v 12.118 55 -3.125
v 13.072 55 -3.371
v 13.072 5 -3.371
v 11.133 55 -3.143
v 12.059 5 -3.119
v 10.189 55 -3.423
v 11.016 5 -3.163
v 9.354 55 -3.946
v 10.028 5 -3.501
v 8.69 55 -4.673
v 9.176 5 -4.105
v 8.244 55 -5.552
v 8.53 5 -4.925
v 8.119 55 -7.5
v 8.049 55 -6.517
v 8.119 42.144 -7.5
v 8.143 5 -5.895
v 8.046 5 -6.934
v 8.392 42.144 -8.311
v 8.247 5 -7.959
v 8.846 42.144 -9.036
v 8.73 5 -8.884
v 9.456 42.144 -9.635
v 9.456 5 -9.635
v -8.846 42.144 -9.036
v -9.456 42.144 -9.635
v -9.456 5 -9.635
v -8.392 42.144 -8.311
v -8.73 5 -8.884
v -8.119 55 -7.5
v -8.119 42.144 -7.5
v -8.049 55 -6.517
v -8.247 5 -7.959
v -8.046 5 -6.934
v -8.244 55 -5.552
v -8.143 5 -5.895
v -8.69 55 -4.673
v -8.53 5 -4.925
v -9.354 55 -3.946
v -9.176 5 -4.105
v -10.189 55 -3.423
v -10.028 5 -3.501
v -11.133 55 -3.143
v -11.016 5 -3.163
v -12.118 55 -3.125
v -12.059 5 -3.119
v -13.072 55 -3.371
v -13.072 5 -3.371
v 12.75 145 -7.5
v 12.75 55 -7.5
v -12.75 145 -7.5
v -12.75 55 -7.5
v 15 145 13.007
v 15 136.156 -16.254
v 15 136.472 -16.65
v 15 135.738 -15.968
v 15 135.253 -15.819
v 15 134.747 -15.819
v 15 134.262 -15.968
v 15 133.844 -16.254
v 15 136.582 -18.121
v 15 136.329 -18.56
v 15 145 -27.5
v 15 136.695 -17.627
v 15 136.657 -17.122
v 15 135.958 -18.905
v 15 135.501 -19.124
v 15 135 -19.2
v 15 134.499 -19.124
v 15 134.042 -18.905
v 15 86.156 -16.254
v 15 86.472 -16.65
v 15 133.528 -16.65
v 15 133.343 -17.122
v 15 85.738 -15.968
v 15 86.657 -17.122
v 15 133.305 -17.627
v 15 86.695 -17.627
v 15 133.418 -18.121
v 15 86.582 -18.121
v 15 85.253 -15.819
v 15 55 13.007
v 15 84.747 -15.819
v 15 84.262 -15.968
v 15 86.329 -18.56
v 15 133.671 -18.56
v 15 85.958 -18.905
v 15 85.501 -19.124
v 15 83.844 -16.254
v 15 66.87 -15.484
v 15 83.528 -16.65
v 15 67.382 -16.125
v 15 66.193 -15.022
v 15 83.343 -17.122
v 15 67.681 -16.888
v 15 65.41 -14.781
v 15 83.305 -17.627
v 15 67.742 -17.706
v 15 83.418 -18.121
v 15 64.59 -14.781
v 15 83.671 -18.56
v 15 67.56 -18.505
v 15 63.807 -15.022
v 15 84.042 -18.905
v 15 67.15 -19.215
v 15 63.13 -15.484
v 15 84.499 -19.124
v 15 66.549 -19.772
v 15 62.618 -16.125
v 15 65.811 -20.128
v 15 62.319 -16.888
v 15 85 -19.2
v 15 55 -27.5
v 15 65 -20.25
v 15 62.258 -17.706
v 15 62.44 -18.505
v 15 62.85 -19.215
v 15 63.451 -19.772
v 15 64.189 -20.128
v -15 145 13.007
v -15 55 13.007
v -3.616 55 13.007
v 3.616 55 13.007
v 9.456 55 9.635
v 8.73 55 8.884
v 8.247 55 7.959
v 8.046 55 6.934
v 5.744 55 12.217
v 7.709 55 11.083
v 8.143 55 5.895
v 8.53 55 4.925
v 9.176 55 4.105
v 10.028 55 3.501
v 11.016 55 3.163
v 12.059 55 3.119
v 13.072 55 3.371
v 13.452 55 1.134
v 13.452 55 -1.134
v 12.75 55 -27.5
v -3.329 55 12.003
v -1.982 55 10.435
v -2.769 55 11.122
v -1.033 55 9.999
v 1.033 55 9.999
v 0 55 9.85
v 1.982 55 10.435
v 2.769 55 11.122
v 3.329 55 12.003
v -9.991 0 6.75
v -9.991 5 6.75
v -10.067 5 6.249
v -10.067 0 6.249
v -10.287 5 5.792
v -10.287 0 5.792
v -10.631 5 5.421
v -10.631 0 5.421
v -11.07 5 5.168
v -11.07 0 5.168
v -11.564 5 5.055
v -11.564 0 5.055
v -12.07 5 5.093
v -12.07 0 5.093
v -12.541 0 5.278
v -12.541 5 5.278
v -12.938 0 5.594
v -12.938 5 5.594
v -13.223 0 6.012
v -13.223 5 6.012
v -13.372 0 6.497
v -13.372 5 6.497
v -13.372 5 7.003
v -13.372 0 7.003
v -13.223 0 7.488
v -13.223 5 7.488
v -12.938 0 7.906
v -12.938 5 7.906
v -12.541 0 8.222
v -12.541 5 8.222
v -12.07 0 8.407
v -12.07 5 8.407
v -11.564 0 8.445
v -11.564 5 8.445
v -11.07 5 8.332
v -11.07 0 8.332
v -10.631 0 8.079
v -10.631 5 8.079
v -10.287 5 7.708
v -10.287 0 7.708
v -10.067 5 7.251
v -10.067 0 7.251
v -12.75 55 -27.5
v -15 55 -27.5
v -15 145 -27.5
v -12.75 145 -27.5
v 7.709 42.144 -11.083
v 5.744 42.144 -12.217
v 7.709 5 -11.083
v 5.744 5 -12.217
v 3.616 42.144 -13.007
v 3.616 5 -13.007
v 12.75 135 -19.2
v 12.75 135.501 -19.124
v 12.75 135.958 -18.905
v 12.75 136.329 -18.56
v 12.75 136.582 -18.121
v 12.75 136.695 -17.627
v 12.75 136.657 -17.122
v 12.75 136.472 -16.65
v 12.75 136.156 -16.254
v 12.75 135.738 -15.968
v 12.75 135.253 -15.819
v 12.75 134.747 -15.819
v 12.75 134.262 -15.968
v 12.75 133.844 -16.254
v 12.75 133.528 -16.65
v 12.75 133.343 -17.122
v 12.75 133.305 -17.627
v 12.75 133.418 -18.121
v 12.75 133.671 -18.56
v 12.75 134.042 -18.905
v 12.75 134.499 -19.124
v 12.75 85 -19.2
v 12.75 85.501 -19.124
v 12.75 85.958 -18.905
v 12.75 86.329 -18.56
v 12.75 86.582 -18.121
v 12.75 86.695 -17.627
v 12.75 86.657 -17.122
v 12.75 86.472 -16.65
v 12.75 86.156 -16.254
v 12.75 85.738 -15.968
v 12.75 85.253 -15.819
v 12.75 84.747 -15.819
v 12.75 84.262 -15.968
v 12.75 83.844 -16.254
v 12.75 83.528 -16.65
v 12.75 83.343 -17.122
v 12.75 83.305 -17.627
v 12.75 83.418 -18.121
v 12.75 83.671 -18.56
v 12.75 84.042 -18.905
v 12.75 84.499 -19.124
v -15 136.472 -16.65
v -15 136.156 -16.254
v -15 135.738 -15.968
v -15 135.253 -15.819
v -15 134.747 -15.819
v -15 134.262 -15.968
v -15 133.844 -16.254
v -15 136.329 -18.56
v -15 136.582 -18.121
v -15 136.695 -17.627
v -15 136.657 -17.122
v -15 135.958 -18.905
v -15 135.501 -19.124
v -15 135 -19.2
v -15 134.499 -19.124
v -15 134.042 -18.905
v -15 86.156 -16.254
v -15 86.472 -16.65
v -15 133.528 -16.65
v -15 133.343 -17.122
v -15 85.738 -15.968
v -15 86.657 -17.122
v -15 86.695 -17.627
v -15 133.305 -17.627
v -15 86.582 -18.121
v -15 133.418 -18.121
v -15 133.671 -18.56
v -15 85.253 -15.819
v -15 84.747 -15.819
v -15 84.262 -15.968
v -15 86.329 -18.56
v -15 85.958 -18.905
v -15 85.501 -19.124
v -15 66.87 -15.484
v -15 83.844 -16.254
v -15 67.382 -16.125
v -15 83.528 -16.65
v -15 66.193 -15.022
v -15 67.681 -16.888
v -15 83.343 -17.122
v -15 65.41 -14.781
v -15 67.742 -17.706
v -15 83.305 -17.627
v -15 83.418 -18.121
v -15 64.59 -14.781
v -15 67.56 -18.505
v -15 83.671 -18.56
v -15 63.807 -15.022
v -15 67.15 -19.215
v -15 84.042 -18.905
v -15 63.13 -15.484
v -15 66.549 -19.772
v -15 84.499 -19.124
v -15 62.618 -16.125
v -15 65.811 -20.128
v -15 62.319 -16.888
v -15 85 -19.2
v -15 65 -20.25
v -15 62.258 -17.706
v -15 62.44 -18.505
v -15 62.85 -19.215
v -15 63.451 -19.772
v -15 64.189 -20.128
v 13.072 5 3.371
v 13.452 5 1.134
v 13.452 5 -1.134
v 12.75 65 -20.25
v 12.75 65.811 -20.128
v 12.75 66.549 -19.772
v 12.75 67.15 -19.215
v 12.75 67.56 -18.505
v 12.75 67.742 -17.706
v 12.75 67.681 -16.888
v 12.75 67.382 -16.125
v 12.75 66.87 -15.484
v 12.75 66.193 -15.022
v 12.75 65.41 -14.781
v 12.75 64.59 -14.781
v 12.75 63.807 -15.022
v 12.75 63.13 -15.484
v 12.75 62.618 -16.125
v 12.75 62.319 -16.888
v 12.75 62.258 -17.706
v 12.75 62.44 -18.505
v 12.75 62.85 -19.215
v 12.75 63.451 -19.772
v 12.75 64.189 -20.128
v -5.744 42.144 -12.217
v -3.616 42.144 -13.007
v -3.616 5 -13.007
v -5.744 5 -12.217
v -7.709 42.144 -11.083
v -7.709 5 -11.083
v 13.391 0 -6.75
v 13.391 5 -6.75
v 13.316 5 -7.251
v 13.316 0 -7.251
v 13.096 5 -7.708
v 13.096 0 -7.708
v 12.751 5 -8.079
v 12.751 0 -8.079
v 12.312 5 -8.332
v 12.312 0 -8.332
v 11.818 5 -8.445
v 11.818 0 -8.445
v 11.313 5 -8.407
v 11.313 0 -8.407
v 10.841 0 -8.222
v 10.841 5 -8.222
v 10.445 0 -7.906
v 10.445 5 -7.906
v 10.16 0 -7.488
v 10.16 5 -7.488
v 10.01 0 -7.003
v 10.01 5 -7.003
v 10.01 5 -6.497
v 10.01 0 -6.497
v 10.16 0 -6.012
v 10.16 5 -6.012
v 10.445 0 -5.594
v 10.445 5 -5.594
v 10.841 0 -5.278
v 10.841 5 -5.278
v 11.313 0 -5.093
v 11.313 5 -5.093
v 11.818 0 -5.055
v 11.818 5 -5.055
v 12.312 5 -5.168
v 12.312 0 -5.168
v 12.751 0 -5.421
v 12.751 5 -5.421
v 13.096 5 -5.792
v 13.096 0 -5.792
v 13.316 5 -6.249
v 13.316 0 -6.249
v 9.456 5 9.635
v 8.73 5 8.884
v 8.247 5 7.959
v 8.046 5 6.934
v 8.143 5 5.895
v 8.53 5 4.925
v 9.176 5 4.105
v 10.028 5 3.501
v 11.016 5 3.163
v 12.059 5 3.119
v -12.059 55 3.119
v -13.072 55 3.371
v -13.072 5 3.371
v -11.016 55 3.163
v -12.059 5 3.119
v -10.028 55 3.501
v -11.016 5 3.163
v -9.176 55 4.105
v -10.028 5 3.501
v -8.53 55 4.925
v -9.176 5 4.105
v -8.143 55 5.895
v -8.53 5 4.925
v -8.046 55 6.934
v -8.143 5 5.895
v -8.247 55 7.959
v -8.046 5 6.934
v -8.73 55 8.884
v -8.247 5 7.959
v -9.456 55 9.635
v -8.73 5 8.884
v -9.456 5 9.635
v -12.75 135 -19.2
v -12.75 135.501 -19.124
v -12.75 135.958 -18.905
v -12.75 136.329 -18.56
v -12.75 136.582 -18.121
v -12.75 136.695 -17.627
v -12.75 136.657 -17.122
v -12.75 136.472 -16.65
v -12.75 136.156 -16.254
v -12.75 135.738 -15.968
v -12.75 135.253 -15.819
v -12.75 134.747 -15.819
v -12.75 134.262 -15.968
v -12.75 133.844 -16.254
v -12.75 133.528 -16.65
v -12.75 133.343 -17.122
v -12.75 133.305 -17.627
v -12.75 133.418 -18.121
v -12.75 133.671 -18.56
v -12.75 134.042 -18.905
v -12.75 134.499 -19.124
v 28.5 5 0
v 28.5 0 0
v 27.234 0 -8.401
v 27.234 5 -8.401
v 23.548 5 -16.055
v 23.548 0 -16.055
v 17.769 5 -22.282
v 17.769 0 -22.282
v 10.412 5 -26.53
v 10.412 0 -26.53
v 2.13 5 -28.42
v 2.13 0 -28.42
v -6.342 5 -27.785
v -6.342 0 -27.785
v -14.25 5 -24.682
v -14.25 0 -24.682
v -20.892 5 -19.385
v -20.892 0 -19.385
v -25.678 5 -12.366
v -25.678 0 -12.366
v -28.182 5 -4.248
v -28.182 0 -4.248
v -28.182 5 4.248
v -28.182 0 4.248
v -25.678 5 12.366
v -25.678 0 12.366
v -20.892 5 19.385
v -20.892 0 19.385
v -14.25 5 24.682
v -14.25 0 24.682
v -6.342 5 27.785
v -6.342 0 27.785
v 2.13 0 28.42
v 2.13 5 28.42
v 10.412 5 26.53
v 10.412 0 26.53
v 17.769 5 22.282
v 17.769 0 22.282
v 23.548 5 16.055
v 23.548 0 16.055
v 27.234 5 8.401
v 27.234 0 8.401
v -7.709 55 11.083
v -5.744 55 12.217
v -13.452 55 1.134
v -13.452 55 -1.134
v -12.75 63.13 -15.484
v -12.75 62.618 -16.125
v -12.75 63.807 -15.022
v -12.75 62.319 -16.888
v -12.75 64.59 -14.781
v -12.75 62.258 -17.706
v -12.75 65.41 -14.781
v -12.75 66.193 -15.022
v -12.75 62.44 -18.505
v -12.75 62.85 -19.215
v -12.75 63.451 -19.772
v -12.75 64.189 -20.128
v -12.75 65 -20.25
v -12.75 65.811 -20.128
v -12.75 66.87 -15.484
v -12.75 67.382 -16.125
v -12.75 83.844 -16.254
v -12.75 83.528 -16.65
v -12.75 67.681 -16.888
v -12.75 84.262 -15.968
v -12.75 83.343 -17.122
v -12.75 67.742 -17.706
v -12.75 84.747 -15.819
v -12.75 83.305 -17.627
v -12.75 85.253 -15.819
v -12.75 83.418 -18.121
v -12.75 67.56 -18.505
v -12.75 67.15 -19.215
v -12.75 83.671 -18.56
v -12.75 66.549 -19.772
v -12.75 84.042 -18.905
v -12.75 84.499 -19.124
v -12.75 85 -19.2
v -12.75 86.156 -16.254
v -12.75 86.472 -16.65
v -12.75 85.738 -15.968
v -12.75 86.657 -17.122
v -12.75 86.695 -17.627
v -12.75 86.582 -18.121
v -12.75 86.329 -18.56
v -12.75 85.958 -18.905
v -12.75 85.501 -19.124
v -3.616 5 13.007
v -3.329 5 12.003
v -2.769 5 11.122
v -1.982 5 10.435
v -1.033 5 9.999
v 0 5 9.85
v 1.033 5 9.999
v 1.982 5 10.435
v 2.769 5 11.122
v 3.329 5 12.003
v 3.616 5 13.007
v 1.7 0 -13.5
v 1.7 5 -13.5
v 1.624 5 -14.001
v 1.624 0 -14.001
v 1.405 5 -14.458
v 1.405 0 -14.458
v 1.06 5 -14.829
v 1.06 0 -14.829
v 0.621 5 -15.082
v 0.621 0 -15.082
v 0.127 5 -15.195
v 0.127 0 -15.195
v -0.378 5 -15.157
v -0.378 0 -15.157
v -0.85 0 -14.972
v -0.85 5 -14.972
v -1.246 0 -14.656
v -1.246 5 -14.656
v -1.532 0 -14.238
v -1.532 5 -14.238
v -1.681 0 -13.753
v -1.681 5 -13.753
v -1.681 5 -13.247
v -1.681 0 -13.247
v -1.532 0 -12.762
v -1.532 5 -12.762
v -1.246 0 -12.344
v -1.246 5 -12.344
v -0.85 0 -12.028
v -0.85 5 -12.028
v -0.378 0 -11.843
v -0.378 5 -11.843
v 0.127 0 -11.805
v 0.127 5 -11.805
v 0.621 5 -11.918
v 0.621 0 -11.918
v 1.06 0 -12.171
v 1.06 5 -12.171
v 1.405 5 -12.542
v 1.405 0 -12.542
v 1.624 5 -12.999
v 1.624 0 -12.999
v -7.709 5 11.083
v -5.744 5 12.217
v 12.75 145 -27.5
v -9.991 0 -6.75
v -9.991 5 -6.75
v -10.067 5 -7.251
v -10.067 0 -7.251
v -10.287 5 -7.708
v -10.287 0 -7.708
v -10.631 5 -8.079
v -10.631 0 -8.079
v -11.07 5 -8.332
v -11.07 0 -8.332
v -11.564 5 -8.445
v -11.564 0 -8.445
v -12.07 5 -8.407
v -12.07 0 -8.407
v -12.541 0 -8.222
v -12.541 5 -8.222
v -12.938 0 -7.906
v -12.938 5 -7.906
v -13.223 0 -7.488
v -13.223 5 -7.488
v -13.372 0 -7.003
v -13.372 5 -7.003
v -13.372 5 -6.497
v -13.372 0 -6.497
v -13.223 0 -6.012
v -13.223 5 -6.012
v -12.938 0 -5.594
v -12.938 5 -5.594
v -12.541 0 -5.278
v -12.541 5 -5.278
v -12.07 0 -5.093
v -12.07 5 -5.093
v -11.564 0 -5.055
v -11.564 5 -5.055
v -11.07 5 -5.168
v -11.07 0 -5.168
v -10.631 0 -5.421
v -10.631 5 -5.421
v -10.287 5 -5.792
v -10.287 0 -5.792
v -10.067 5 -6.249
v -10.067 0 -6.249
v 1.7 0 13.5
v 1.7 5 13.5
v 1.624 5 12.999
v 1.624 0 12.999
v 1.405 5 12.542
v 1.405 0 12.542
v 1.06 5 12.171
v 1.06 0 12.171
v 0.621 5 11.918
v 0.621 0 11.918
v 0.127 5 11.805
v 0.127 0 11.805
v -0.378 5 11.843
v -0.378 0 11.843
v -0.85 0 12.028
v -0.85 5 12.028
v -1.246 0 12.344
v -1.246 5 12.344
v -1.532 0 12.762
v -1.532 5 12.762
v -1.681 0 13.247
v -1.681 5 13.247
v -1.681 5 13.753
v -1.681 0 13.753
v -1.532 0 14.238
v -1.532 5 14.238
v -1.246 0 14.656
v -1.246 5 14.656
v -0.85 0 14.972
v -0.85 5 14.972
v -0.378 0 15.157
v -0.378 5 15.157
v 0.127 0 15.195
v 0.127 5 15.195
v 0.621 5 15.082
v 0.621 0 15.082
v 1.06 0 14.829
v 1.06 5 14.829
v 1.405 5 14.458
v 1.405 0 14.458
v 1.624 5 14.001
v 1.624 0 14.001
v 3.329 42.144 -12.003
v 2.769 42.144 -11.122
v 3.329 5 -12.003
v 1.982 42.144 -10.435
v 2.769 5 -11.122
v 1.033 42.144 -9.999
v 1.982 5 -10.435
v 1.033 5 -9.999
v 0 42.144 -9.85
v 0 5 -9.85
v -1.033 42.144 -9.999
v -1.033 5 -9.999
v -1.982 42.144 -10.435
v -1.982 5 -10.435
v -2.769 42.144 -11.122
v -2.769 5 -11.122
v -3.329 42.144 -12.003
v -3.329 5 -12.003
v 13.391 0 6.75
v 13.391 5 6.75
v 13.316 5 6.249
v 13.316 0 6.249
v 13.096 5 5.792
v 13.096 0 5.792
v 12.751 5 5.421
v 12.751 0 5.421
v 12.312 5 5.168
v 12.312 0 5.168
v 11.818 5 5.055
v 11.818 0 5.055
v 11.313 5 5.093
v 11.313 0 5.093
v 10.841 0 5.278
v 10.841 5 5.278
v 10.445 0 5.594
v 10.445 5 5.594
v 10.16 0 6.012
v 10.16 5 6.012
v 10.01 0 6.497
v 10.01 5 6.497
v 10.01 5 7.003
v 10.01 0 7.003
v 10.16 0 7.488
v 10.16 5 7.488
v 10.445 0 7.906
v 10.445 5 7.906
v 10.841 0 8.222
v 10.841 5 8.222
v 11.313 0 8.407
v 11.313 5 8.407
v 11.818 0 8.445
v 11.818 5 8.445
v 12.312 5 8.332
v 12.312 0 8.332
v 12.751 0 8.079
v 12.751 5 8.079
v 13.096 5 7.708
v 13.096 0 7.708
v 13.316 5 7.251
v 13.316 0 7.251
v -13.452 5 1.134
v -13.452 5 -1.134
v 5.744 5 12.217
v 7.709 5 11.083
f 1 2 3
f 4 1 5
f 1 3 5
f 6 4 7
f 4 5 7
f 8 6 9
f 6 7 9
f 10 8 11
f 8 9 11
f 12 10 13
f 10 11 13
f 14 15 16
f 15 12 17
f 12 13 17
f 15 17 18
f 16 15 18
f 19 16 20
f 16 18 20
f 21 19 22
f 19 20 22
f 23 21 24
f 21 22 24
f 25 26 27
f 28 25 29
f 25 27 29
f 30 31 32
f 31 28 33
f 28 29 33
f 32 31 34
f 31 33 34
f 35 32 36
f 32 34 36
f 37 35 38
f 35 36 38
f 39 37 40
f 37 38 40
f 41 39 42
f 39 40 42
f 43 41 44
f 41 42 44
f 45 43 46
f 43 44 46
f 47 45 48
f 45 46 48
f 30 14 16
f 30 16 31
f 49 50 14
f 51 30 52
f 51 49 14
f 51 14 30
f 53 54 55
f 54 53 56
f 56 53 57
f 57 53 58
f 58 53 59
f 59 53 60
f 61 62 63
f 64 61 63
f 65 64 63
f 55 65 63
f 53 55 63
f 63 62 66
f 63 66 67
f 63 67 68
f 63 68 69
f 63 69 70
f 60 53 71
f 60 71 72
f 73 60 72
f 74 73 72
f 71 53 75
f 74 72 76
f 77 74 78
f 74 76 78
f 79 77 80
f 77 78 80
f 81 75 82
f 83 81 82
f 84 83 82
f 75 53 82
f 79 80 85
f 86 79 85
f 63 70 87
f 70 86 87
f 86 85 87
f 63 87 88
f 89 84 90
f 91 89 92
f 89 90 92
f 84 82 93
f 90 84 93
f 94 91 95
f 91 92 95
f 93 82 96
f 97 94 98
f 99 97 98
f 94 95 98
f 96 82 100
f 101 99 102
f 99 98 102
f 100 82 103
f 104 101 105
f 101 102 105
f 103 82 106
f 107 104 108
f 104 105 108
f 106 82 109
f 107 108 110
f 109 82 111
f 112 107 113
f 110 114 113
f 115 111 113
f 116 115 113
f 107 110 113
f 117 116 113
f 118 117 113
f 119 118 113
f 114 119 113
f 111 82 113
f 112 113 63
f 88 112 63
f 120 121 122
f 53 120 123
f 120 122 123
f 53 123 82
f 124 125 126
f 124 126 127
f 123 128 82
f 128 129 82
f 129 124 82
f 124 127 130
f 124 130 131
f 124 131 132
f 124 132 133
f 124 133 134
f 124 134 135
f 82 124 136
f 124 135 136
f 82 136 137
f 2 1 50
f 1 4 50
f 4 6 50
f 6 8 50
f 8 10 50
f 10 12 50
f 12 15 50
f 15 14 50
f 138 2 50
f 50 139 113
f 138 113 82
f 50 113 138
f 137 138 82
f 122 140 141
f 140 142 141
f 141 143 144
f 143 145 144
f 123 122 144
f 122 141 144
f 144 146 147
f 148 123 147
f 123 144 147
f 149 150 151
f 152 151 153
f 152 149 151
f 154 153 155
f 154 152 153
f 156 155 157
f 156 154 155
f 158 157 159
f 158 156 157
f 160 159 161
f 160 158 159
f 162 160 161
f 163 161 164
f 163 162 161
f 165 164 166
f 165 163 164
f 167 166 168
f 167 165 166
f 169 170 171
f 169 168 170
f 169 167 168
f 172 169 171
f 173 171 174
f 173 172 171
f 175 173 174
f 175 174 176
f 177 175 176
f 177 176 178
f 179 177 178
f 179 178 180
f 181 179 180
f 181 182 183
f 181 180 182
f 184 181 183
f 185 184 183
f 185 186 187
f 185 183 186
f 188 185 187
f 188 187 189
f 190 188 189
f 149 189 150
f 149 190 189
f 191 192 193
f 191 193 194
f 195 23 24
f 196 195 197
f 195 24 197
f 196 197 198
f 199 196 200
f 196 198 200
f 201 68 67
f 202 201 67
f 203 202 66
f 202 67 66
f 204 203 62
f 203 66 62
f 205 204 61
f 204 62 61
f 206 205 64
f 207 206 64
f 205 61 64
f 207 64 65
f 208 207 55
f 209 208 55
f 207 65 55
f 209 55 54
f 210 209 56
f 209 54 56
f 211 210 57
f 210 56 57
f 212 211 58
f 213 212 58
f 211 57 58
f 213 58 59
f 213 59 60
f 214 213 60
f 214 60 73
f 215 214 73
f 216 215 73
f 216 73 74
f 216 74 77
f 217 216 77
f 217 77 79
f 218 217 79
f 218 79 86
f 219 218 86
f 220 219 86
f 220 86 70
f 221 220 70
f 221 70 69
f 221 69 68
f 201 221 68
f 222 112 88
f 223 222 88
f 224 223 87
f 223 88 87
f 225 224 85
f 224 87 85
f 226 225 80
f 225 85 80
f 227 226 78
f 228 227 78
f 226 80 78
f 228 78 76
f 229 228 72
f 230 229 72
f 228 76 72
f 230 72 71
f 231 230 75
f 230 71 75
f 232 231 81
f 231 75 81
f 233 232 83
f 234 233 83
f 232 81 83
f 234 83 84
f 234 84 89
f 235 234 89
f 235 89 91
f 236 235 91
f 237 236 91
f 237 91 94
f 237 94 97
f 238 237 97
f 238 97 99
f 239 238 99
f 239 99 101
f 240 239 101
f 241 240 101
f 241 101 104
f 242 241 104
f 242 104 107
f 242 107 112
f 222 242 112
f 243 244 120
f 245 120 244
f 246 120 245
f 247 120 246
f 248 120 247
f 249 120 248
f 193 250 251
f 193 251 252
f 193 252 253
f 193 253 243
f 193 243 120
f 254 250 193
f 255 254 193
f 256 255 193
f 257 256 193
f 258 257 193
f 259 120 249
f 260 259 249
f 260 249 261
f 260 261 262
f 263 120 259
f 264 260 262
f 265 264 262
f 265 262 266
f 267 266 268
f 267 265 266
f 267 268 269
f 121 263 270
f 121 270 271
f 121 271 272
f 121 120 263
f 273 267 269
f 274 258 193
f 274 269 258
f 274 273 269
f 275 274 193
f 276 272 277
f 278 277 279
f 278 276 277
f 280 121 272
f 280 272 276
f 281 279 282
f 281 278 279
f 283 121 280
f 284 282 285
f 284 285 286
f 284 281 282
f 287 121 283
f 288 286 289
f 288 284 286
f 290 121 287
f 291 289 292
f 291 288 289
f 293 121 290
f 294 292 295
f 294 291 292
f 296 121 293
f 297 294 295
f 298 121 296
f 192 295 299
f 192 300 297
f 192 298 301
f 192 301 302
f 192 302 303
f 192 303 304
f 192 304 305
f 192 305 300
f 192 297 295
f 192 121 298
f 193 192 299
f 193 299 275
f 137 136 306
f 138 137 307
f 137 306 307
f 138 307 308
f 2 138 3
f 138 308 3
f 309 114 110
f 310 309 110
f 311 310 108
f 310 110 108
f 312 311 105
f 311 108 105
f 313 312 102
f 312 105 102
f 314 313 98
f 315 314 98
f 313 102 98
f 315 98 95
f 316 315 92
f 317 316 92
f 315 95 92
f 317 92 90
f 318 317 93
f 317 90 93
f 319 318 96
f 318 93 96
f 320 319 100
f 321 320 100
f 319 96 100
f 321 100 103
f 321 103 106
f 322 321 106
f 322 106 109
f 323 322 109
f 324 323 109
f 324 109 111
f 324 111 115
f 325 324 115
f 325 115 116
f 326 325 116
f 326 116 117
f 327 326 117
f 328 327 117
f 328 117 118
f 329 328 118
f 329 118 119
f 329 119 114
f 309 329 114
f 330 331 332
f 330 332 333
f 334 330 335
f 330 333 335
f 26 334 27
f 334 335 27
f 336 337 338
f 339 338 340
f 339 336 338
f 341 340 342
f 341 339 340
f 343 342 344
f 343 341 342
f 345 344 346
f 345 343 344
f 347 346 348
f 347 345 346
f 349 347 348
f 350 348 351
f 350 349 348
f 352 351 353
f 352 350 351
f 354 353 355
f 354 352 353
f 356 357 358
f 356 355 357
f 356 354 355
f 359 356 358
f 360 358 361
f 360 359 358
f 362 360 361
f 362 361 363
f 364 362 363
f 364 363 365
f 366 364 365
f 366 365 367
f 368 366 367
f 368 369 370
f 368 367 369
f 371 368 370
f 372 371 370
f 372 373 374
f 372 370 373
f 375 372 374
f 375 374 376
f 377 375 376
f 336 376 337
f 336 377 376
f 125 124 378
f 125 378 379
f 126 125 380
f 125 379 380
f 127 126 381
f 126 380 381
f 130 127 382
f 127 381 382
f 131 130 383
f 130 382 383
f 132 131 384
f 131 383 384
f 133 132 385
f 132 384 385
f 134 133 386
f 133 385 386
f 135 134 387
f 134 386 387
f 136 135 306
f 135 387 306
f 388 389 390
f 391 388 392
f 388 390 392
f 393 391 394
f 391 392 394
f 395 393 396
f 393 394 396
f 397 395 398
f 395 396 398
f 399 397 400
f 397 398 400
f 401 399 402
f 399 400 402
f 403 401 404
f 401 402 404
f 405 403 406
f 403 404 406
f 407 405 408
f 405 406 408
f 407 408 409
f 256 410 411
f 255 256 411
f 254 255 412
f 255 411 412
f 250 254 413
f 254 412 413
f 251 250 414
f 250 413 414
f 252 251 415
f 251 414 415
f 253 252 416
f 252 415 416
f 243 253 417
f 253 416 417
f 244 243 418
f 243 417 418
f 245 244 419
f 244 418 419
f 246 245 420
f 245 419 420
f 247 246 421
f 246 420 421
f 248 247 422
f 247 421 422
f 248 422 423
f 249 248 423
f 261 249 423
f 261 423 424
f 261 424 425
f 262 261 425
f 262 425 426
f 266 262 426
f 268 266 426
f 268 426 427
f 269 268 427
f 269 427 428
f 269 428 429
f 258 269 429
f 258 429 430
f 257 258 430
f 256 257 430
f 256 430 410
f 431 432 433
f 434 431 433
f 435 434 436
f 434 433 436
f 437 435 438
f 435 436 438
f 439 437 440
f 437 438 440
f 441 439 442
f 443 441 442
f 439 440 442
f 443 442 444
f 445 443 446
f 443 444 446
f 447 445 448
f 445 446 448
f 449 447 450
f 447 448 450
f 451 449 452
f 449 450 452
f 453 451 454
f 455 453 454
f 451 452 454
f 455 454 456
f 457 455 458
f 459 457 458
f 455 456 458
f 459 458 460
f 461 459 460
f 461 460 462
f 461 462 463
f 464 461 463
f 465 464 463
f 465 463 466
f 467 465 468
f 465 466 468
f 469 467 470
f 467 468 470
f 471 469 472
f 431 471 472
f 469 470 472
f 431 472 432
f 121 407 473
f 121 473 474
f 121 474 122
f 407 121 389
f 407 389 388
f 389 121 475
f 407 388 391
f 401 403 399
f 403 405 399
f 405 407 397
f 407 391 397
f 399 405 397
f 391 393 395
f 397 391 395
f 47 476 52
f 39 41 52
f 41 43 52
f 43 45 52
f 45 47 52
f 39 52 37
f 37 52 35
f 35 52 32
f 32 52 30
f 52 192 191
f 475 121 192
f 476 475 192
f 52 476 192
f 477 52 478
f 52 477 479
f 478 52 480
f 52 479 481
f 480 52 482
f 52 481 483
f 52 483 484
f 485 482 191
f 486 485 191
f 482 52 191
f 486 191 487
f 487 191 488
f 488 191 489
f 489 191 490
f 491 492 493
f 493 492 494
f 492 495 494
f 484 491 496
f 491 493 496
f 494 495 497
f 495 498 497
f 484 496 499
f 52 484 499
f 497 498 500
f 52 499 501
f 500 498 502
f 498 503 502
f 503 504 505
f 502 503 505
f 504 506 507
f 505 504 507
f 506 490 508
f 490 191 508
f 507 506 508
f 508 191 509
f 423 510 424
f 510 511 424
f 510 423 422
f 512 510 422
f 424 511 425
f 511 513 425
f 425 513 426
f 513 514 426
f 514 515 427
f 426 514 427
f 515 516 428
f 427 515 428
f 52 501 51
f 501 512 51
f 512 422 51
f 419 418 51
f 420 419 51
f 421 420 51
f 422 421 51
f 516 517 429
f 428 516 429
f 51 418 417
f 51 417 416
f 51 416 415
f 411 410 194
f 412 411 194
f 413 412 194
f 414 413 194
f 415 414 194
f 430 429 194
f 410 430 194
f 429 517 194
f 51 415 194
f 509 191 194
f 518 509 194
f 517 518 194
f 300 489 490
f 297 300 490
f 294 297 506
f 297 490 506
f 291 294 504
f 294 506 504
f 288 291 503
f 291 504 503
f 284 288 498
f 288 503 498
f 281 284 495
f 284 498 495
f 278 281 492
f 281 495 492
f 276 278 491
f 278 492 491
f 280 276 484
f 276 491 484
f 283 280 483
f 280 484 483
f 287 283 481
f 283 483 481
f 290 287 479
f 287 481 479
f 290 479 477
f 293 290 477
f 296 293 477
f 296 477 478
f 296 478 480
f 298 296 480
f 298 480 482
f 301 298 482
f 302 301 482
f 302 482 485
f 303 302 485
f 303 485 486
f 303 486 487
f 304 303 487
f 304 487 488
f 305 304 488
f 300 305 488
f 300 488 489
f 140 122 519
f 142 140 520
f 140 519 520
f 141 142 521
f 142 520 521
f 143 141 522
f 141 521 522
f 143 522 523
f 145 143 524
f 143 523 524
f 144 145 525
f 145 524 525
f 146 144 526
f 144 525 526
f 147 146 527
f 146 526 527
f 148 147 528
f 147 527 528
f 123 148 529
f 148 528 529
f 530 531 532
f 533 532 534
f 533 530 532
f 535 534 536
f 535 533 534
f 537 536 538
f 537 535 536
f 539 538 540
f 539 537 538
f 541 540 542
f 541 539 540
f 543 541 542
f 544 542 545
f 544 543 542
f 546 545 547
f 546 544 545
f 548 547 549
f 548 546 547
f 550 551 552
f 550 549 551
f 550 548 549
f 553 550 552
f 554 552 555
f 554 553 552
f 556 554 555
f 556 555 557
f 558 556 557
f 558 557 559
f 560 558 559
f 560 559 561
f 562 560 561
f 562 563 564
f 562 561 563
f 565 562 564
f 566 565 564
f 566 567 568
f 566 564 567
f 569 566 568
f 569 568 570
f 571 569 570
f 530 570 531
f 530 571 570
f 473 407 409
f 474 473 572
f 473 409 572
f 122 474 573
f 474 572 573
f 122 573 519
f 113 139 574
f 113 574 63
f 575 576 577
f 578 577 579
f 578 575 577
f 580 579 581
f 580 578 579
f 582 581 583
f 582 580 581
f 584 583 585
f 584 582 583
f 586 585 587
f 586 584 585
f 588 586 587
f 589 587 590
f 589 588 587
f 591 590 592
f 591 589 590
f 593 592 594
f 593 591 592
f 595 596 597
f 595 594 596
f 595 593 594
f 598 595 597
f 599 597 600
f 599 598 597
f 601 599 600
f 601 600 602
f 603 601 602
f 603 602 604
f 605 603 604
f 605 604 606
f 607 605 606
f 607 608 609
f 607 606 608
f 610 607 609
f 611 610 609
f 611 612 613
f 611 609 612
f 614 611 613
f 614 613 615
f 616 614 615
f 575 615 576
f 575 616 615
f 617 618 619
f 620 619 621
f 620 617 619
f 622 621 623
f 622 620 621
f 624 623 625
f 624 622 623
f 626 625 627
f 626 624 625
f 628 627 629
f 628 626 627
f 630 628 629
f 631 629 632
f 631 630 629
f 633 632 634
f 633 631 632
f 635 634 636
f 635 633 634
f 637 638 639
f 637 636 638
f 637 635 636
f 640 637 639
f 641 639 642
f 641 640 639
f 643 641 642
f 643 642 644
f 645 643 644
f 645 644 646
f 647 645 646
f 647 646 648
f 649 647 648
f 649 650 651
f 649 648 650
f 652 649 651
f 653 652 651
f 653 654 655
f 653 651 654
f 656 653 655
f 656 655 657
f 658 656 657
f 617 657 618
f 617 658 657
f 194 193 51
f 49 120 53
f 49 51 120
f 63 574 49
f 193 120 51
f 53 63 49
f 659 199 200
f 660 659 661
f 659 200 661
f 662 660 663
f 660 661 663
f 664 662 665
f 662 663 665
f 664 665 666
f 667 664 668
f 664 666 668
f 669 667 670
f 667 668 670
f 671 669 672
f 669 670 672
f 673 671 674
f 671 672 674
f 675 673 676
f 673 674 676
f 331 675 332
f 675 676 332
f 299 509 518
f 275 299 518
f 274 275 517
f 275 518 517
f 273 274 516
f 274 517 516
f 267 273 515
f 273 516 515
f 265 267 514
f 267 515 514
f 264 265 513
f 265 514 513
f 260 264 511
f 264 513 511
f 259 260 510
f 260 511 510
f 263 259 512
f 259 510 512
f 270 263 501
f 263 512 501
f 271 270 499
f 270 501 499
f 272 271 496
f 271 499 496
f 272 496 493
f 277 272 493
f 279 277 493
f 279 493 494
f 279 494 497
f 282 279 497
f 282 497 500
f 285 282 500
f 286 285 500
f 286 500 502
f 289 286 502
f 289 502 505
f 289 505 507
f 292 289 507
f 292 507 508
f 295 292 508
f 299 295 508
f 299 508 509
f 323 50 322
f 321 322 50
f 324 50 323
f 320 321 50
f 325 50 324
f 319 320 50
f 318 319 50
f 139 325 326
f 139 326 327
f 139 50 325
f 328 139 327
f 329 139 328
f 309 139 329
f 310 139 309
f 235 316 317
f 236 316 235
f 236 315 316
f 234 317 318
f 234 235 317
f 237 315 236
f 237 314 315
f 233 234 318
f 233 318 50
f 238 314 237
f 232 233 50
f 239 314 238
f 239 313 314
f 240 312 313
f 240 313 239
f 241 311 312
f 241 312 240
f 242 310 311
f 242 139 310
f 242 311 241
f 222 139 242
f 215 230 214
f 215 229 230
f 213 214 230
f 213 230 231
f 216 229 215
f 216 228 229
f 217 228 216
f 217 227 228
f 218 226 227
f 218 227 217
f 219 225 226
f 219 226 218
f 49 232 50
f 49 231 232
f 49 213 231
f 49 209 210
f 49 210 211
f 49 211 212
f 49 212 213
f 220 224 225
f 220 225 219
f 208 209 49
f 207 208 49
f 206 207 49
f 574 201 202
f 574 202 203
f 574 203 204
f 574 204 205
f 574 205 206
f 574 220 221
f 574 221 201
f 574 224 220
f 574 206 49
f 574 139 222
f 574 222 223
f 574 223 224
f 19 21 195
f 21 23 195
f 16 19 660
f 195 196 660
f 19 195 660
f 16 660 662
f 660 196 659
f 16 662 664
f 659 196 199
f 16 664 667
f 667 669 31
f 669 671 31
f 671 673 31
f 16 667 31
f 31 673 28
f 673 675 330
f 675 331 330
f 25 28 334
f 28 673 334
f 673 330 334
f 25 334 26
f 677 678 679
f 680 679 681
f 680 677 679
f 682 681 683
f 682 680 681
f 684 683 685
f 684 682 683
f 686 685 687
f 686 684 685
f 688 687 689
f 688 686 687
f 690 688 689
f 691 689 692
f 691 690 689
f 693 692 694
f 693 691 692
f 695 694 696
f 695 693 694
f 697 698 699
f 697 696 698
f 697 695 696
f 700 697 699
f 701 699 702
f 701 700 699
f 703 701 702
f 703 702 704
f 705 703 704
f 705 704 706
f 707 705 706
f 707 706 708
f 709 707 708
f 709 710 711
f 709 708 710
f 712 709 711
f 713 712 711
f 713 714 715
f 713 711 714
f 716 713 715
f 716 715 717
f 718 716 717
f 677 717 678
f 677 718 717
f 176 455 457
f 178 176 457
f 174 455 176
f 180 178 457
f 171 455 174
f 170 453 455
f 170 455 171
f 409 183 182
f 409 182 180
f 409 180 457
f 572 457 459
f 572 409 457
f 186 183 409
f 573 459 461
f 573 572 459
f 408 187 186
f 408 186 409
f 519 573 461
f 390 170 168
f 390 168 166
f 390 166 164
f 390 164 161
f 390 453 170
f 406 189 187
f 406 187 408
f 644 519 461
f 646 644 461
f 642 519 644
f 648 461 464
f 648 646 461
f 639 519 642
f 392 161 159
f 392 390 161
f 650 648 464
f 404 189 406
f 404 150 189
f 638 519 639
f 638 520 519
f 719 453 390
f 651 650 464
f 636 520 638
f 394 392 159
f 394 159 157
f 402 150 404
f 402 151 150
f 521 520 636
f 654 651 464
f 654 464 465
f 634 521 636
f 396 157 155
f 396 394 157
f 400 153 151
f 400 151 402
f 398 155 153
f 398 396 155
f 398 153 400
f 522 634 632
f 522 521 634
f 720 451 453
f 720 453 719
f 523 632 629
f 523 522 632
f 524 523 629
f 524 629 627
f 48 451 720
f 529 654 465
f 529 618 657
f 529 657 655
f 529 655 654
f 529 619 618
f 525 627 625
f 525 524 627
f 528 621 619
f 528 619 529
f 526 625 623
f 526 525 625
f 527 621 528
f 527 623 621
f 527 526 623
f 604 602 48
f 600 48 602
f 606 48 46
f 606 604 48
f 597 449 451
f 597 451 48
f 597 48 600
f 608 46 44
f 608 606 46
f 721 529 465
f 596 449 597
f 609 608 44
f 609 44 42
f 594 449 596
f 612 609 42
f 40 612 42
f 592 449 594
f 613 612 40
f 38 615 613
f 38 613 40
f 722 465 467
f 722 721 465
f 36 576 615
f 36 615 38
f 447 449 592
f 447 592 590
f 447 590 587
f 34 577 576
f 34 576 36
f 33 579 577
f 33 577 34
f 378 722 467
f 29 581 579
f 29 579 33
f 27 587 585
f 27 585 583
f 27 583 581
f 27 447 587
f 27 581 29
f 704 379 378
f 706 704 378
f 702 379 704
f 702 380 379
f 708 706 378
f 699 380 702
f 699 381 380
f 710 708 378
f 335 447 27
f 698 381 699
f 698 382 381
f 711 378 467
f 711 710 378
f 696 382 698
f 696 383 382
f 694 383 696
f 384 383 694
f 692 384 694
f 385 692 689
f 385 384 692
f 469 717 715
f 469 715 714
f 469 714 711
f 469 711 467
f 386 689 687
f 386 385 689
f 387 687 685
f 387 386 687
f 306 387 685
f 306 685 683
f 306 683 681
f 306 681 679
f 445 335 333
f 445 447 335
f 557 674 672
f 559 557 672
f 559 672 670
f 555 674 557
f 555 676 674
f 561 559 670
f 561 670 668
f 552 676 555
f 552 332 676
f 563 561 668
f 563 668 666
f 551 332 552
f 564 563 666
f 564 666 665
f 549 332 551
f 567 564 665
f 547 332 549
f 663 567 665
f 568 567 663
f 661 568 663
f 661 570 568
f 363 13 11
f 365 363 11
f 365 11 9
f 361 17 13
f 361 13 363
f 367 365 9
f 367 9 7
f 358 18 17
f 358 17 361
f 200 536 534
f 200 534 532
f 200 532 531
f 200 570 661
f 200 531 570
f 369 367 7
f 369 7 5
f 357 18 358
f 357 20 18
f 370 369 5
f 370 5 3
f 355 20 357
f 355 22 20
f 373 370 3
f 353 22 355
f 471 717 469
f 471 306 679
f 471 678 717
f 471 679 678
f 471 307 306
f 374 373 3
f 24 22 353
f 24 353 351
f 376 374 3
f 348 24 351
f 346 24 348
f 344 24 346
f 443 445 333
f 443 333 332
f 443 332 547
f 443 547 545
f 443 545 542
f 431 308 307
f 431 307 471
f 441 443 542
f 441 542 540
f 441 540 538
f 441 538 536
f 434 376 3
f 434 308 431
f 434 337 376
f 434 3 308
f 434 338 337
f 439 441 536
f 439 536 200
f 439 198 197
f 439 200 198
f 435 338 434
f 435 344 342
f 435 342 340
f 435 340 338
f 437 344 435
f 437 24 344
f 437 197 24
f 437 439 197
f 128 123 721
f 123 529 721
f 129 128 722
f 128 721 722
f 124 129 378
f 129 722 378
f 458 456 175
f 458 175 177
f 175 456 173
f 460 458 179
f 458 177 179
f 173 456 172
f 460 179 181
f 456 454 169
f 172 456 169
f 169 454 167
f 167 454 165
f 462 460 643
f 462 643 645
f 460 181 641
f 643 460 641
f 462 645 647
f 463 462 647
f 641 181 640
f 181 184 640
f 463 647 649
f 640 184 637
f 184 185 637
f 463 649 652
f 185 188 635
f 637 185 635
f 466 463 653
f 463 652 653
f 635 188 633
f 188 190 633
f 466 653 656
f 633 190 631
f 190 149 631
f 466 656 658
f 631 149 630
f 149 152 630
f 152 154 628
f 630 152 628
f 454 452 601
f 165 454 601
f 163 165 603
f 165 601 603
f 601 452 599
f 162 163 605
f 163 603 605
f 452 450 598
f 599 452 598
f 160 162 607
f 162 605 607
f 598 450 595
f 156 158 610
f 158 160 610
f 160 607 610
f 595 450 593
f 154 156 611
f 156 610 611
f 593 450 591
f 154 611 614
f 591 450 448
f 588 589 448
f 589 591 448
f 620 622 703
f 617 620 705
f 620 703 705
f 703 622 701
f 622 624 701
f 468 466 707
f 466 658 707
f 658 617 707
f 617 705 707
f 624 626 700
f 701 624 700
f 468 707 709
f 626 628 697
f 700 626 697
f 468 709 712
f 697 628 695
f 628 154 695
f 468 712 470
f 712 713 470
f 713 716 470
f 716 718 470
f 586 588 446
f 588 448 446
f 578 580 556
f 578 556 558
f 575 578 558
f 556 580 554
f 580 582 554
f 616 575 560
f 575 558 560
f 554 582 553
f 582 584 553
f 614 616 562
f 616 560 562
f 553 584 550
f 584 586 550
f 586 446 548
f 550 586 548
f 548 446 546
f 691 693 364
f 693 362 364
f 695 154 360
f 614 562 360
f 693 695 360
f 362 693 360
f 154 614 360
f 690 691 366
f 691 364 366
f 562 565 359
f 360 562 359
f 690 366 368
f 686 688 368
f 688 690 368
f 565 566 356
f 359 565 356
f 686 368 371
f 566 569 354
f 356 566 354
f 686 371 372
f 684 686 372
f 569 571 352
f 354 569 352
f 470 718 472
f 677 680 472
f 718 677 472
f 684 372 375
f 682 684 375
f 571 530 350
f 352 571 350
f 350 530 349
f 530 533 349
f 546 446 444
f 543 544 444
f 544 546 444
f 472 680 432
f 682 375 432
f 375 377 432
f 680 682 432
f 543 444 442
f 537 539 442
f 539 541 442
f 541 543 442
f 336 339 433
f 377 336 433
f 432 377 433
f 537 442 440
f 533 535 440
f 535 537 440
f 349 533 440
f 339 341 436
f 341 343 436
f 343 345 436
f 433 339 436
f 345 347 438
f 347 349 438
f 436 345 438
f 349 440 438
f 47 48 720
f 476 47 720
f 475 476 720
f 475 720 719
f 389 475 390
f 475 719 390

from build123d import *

# Parameters (mm, degrees)
SKETCH_1_R          = 28.5
SKETCH_1_R_2        = 1.7
EXTRUDE_1_DEPTH     = 5
SKETCH_2_R          = 13.5
EXTRUDE_2_DEPTH     = 50
SKETCH_3_R          = 3.65
CUT_EXTRUDE_1_DEPTH = 50
SKETCH_4_W          = 30
SKETCH_4_H          = 55
EXTRUDE_3_DEPTH     = 90
SKETCH_6_R          = 1.7
SKETCH_6_R_2        = 2.75
CUT_EXTRUDE_2_DEPTH = 50
SKETCH_7_W          = 25.5
SKETCH_7_H          = 110.843536678
CUT_EXTRUDE_3_DEPTH = 20
SKETCH_8_W          = 36.70966092
SKETCH_8_H          = 18.654828845
CUT_EXTRUDE_4_DEPTH = 110


with BuildPart() as part:
    # 草图1 → 凸台-拉伸1 (new body)
    with BuildSketch(Plane(origin=(0, 0, 0), x_dir=(1, 0, 0), z_dir=(0, 1, 0))):
        Circle(SKETCH_1_R)
        with Locations((0, 13.5)):
            Circle(SKETCH_1_R_2, mode=Mode.SUBTRACT)
        with Locations((11.691342951, 6.75)):
            Circle(SKETCH_1_R_2, mode=Mode.SUBTRACT)
        with Locations((11.691342951, -6.75)):
            Circle(SKETCH_1_R_2, mode=Mode.SUBTRACT)
        with Locations((0, -13.5)):
            Circle(SKETCH_1_R_2, mode=Mode.SUBTRACT)
        with Locations((-11.691342951, -6.75)):
            Circle(SKETCH_1_R_2, mode=Mode.SUBTRACT)
        with Locations((-11.691342951, 6.75)):
            Circle(SKETCH_1_R_2, mode=Mode.SUBTRACT)
    extrude(amount=EXTRUDE_1_DEPTH)

    # 草图2 → 凸台-拉伸2 (add)
    with BuildSketch(Plane(origin=(0, 5, 0), x_dir=(1, 0, 0), z_dir=(0, 1, 0))):
        Circle(SKETCH_2_R)
    extrude(amount=EXTRUDE_2_DEPTH)

    # 草图3 → 切除-拉伸1 (cut)
    with BuildSketch(Plane.XZ.offset(-5)):
        with Locations((-11.691342951, -6.75)):
            Circle(SKETCH_3_R)
        with Locations((-11.691342951, 6.75)):
            Circle(SKETCH_3_R)
        with Locations((0, 13.5)):
            Circle(SKETCH_3_R)
        with Locations((11.691342951, 6.75)):
            Circle(SKETCH_3_R)
        with Locations((11.691342951, -6.75)):
            Circle(SKETCH_3_R)
        with Locations((0, -13.5)):
            Circle(SKETCH_3_R)
    extrude(amount=-CUT_EXTRUDE_1_DEPTH, mode=Mode.SUBTRACT)

    # 草图4 → 凸台-拉伸3 (add)
    with BuildSketch(Plane(origin=(0, 55, 0), x_dir=(1, 0, 0), z_dir=(0, 1, 0))):
        Rectangle(SKETCH_4_W, SKETCH_4_H)
    extrude(amount=EXTRUDE_3_DEPTH)

    # 草图6 → 切除-拉伸2 (cut)
    with BuildSketch(Plane(origin=(15, 0, 0), x_dir=(0, 0, -1), z_dir=(1, 0, 0))):
        with Locations((17.5, 85)):
            Circle(SKETCH_6_R)
        with Locations((17.5, 135)):
            Circle(SKETCH_6_R)
        with Locations((17.5, 65)):
            Circle(SKETCH_6_R_2)
    extrude(amount=-CUT_EXTRUDE_2_DEPTH, mode=Mode.SUBTRACT)

    # 草图7 → 切除-拉伸3 (cut)
    with BuildSketch(Plane(origin=(0, 0, -27.5), x_dir=(-1, 0, 0), z_dir=(0, 0, -1))):
        with Locations((0, 97.565521138)):
            Rectangle(SKETCH_7_W, SKETCH_7_H)
    extrude(amount=-CUT_EXTRUDE_3_DEPTH, mode=Mode.SUBTRACT)

    # 草图8 → 切除-拉伸4 (cut)
    with BuildSketch(Plane.XZ.offset(-55)):
        with Locations((-1.438600971, 22.333988497)):
            Rectangle(SKETCH_8_W, SKETCH_8_H)
    extrude(amount=-CUT_EXTRUDE_4_DEPTH, mode=Mode.SUBTRACT)


solid = part.part
